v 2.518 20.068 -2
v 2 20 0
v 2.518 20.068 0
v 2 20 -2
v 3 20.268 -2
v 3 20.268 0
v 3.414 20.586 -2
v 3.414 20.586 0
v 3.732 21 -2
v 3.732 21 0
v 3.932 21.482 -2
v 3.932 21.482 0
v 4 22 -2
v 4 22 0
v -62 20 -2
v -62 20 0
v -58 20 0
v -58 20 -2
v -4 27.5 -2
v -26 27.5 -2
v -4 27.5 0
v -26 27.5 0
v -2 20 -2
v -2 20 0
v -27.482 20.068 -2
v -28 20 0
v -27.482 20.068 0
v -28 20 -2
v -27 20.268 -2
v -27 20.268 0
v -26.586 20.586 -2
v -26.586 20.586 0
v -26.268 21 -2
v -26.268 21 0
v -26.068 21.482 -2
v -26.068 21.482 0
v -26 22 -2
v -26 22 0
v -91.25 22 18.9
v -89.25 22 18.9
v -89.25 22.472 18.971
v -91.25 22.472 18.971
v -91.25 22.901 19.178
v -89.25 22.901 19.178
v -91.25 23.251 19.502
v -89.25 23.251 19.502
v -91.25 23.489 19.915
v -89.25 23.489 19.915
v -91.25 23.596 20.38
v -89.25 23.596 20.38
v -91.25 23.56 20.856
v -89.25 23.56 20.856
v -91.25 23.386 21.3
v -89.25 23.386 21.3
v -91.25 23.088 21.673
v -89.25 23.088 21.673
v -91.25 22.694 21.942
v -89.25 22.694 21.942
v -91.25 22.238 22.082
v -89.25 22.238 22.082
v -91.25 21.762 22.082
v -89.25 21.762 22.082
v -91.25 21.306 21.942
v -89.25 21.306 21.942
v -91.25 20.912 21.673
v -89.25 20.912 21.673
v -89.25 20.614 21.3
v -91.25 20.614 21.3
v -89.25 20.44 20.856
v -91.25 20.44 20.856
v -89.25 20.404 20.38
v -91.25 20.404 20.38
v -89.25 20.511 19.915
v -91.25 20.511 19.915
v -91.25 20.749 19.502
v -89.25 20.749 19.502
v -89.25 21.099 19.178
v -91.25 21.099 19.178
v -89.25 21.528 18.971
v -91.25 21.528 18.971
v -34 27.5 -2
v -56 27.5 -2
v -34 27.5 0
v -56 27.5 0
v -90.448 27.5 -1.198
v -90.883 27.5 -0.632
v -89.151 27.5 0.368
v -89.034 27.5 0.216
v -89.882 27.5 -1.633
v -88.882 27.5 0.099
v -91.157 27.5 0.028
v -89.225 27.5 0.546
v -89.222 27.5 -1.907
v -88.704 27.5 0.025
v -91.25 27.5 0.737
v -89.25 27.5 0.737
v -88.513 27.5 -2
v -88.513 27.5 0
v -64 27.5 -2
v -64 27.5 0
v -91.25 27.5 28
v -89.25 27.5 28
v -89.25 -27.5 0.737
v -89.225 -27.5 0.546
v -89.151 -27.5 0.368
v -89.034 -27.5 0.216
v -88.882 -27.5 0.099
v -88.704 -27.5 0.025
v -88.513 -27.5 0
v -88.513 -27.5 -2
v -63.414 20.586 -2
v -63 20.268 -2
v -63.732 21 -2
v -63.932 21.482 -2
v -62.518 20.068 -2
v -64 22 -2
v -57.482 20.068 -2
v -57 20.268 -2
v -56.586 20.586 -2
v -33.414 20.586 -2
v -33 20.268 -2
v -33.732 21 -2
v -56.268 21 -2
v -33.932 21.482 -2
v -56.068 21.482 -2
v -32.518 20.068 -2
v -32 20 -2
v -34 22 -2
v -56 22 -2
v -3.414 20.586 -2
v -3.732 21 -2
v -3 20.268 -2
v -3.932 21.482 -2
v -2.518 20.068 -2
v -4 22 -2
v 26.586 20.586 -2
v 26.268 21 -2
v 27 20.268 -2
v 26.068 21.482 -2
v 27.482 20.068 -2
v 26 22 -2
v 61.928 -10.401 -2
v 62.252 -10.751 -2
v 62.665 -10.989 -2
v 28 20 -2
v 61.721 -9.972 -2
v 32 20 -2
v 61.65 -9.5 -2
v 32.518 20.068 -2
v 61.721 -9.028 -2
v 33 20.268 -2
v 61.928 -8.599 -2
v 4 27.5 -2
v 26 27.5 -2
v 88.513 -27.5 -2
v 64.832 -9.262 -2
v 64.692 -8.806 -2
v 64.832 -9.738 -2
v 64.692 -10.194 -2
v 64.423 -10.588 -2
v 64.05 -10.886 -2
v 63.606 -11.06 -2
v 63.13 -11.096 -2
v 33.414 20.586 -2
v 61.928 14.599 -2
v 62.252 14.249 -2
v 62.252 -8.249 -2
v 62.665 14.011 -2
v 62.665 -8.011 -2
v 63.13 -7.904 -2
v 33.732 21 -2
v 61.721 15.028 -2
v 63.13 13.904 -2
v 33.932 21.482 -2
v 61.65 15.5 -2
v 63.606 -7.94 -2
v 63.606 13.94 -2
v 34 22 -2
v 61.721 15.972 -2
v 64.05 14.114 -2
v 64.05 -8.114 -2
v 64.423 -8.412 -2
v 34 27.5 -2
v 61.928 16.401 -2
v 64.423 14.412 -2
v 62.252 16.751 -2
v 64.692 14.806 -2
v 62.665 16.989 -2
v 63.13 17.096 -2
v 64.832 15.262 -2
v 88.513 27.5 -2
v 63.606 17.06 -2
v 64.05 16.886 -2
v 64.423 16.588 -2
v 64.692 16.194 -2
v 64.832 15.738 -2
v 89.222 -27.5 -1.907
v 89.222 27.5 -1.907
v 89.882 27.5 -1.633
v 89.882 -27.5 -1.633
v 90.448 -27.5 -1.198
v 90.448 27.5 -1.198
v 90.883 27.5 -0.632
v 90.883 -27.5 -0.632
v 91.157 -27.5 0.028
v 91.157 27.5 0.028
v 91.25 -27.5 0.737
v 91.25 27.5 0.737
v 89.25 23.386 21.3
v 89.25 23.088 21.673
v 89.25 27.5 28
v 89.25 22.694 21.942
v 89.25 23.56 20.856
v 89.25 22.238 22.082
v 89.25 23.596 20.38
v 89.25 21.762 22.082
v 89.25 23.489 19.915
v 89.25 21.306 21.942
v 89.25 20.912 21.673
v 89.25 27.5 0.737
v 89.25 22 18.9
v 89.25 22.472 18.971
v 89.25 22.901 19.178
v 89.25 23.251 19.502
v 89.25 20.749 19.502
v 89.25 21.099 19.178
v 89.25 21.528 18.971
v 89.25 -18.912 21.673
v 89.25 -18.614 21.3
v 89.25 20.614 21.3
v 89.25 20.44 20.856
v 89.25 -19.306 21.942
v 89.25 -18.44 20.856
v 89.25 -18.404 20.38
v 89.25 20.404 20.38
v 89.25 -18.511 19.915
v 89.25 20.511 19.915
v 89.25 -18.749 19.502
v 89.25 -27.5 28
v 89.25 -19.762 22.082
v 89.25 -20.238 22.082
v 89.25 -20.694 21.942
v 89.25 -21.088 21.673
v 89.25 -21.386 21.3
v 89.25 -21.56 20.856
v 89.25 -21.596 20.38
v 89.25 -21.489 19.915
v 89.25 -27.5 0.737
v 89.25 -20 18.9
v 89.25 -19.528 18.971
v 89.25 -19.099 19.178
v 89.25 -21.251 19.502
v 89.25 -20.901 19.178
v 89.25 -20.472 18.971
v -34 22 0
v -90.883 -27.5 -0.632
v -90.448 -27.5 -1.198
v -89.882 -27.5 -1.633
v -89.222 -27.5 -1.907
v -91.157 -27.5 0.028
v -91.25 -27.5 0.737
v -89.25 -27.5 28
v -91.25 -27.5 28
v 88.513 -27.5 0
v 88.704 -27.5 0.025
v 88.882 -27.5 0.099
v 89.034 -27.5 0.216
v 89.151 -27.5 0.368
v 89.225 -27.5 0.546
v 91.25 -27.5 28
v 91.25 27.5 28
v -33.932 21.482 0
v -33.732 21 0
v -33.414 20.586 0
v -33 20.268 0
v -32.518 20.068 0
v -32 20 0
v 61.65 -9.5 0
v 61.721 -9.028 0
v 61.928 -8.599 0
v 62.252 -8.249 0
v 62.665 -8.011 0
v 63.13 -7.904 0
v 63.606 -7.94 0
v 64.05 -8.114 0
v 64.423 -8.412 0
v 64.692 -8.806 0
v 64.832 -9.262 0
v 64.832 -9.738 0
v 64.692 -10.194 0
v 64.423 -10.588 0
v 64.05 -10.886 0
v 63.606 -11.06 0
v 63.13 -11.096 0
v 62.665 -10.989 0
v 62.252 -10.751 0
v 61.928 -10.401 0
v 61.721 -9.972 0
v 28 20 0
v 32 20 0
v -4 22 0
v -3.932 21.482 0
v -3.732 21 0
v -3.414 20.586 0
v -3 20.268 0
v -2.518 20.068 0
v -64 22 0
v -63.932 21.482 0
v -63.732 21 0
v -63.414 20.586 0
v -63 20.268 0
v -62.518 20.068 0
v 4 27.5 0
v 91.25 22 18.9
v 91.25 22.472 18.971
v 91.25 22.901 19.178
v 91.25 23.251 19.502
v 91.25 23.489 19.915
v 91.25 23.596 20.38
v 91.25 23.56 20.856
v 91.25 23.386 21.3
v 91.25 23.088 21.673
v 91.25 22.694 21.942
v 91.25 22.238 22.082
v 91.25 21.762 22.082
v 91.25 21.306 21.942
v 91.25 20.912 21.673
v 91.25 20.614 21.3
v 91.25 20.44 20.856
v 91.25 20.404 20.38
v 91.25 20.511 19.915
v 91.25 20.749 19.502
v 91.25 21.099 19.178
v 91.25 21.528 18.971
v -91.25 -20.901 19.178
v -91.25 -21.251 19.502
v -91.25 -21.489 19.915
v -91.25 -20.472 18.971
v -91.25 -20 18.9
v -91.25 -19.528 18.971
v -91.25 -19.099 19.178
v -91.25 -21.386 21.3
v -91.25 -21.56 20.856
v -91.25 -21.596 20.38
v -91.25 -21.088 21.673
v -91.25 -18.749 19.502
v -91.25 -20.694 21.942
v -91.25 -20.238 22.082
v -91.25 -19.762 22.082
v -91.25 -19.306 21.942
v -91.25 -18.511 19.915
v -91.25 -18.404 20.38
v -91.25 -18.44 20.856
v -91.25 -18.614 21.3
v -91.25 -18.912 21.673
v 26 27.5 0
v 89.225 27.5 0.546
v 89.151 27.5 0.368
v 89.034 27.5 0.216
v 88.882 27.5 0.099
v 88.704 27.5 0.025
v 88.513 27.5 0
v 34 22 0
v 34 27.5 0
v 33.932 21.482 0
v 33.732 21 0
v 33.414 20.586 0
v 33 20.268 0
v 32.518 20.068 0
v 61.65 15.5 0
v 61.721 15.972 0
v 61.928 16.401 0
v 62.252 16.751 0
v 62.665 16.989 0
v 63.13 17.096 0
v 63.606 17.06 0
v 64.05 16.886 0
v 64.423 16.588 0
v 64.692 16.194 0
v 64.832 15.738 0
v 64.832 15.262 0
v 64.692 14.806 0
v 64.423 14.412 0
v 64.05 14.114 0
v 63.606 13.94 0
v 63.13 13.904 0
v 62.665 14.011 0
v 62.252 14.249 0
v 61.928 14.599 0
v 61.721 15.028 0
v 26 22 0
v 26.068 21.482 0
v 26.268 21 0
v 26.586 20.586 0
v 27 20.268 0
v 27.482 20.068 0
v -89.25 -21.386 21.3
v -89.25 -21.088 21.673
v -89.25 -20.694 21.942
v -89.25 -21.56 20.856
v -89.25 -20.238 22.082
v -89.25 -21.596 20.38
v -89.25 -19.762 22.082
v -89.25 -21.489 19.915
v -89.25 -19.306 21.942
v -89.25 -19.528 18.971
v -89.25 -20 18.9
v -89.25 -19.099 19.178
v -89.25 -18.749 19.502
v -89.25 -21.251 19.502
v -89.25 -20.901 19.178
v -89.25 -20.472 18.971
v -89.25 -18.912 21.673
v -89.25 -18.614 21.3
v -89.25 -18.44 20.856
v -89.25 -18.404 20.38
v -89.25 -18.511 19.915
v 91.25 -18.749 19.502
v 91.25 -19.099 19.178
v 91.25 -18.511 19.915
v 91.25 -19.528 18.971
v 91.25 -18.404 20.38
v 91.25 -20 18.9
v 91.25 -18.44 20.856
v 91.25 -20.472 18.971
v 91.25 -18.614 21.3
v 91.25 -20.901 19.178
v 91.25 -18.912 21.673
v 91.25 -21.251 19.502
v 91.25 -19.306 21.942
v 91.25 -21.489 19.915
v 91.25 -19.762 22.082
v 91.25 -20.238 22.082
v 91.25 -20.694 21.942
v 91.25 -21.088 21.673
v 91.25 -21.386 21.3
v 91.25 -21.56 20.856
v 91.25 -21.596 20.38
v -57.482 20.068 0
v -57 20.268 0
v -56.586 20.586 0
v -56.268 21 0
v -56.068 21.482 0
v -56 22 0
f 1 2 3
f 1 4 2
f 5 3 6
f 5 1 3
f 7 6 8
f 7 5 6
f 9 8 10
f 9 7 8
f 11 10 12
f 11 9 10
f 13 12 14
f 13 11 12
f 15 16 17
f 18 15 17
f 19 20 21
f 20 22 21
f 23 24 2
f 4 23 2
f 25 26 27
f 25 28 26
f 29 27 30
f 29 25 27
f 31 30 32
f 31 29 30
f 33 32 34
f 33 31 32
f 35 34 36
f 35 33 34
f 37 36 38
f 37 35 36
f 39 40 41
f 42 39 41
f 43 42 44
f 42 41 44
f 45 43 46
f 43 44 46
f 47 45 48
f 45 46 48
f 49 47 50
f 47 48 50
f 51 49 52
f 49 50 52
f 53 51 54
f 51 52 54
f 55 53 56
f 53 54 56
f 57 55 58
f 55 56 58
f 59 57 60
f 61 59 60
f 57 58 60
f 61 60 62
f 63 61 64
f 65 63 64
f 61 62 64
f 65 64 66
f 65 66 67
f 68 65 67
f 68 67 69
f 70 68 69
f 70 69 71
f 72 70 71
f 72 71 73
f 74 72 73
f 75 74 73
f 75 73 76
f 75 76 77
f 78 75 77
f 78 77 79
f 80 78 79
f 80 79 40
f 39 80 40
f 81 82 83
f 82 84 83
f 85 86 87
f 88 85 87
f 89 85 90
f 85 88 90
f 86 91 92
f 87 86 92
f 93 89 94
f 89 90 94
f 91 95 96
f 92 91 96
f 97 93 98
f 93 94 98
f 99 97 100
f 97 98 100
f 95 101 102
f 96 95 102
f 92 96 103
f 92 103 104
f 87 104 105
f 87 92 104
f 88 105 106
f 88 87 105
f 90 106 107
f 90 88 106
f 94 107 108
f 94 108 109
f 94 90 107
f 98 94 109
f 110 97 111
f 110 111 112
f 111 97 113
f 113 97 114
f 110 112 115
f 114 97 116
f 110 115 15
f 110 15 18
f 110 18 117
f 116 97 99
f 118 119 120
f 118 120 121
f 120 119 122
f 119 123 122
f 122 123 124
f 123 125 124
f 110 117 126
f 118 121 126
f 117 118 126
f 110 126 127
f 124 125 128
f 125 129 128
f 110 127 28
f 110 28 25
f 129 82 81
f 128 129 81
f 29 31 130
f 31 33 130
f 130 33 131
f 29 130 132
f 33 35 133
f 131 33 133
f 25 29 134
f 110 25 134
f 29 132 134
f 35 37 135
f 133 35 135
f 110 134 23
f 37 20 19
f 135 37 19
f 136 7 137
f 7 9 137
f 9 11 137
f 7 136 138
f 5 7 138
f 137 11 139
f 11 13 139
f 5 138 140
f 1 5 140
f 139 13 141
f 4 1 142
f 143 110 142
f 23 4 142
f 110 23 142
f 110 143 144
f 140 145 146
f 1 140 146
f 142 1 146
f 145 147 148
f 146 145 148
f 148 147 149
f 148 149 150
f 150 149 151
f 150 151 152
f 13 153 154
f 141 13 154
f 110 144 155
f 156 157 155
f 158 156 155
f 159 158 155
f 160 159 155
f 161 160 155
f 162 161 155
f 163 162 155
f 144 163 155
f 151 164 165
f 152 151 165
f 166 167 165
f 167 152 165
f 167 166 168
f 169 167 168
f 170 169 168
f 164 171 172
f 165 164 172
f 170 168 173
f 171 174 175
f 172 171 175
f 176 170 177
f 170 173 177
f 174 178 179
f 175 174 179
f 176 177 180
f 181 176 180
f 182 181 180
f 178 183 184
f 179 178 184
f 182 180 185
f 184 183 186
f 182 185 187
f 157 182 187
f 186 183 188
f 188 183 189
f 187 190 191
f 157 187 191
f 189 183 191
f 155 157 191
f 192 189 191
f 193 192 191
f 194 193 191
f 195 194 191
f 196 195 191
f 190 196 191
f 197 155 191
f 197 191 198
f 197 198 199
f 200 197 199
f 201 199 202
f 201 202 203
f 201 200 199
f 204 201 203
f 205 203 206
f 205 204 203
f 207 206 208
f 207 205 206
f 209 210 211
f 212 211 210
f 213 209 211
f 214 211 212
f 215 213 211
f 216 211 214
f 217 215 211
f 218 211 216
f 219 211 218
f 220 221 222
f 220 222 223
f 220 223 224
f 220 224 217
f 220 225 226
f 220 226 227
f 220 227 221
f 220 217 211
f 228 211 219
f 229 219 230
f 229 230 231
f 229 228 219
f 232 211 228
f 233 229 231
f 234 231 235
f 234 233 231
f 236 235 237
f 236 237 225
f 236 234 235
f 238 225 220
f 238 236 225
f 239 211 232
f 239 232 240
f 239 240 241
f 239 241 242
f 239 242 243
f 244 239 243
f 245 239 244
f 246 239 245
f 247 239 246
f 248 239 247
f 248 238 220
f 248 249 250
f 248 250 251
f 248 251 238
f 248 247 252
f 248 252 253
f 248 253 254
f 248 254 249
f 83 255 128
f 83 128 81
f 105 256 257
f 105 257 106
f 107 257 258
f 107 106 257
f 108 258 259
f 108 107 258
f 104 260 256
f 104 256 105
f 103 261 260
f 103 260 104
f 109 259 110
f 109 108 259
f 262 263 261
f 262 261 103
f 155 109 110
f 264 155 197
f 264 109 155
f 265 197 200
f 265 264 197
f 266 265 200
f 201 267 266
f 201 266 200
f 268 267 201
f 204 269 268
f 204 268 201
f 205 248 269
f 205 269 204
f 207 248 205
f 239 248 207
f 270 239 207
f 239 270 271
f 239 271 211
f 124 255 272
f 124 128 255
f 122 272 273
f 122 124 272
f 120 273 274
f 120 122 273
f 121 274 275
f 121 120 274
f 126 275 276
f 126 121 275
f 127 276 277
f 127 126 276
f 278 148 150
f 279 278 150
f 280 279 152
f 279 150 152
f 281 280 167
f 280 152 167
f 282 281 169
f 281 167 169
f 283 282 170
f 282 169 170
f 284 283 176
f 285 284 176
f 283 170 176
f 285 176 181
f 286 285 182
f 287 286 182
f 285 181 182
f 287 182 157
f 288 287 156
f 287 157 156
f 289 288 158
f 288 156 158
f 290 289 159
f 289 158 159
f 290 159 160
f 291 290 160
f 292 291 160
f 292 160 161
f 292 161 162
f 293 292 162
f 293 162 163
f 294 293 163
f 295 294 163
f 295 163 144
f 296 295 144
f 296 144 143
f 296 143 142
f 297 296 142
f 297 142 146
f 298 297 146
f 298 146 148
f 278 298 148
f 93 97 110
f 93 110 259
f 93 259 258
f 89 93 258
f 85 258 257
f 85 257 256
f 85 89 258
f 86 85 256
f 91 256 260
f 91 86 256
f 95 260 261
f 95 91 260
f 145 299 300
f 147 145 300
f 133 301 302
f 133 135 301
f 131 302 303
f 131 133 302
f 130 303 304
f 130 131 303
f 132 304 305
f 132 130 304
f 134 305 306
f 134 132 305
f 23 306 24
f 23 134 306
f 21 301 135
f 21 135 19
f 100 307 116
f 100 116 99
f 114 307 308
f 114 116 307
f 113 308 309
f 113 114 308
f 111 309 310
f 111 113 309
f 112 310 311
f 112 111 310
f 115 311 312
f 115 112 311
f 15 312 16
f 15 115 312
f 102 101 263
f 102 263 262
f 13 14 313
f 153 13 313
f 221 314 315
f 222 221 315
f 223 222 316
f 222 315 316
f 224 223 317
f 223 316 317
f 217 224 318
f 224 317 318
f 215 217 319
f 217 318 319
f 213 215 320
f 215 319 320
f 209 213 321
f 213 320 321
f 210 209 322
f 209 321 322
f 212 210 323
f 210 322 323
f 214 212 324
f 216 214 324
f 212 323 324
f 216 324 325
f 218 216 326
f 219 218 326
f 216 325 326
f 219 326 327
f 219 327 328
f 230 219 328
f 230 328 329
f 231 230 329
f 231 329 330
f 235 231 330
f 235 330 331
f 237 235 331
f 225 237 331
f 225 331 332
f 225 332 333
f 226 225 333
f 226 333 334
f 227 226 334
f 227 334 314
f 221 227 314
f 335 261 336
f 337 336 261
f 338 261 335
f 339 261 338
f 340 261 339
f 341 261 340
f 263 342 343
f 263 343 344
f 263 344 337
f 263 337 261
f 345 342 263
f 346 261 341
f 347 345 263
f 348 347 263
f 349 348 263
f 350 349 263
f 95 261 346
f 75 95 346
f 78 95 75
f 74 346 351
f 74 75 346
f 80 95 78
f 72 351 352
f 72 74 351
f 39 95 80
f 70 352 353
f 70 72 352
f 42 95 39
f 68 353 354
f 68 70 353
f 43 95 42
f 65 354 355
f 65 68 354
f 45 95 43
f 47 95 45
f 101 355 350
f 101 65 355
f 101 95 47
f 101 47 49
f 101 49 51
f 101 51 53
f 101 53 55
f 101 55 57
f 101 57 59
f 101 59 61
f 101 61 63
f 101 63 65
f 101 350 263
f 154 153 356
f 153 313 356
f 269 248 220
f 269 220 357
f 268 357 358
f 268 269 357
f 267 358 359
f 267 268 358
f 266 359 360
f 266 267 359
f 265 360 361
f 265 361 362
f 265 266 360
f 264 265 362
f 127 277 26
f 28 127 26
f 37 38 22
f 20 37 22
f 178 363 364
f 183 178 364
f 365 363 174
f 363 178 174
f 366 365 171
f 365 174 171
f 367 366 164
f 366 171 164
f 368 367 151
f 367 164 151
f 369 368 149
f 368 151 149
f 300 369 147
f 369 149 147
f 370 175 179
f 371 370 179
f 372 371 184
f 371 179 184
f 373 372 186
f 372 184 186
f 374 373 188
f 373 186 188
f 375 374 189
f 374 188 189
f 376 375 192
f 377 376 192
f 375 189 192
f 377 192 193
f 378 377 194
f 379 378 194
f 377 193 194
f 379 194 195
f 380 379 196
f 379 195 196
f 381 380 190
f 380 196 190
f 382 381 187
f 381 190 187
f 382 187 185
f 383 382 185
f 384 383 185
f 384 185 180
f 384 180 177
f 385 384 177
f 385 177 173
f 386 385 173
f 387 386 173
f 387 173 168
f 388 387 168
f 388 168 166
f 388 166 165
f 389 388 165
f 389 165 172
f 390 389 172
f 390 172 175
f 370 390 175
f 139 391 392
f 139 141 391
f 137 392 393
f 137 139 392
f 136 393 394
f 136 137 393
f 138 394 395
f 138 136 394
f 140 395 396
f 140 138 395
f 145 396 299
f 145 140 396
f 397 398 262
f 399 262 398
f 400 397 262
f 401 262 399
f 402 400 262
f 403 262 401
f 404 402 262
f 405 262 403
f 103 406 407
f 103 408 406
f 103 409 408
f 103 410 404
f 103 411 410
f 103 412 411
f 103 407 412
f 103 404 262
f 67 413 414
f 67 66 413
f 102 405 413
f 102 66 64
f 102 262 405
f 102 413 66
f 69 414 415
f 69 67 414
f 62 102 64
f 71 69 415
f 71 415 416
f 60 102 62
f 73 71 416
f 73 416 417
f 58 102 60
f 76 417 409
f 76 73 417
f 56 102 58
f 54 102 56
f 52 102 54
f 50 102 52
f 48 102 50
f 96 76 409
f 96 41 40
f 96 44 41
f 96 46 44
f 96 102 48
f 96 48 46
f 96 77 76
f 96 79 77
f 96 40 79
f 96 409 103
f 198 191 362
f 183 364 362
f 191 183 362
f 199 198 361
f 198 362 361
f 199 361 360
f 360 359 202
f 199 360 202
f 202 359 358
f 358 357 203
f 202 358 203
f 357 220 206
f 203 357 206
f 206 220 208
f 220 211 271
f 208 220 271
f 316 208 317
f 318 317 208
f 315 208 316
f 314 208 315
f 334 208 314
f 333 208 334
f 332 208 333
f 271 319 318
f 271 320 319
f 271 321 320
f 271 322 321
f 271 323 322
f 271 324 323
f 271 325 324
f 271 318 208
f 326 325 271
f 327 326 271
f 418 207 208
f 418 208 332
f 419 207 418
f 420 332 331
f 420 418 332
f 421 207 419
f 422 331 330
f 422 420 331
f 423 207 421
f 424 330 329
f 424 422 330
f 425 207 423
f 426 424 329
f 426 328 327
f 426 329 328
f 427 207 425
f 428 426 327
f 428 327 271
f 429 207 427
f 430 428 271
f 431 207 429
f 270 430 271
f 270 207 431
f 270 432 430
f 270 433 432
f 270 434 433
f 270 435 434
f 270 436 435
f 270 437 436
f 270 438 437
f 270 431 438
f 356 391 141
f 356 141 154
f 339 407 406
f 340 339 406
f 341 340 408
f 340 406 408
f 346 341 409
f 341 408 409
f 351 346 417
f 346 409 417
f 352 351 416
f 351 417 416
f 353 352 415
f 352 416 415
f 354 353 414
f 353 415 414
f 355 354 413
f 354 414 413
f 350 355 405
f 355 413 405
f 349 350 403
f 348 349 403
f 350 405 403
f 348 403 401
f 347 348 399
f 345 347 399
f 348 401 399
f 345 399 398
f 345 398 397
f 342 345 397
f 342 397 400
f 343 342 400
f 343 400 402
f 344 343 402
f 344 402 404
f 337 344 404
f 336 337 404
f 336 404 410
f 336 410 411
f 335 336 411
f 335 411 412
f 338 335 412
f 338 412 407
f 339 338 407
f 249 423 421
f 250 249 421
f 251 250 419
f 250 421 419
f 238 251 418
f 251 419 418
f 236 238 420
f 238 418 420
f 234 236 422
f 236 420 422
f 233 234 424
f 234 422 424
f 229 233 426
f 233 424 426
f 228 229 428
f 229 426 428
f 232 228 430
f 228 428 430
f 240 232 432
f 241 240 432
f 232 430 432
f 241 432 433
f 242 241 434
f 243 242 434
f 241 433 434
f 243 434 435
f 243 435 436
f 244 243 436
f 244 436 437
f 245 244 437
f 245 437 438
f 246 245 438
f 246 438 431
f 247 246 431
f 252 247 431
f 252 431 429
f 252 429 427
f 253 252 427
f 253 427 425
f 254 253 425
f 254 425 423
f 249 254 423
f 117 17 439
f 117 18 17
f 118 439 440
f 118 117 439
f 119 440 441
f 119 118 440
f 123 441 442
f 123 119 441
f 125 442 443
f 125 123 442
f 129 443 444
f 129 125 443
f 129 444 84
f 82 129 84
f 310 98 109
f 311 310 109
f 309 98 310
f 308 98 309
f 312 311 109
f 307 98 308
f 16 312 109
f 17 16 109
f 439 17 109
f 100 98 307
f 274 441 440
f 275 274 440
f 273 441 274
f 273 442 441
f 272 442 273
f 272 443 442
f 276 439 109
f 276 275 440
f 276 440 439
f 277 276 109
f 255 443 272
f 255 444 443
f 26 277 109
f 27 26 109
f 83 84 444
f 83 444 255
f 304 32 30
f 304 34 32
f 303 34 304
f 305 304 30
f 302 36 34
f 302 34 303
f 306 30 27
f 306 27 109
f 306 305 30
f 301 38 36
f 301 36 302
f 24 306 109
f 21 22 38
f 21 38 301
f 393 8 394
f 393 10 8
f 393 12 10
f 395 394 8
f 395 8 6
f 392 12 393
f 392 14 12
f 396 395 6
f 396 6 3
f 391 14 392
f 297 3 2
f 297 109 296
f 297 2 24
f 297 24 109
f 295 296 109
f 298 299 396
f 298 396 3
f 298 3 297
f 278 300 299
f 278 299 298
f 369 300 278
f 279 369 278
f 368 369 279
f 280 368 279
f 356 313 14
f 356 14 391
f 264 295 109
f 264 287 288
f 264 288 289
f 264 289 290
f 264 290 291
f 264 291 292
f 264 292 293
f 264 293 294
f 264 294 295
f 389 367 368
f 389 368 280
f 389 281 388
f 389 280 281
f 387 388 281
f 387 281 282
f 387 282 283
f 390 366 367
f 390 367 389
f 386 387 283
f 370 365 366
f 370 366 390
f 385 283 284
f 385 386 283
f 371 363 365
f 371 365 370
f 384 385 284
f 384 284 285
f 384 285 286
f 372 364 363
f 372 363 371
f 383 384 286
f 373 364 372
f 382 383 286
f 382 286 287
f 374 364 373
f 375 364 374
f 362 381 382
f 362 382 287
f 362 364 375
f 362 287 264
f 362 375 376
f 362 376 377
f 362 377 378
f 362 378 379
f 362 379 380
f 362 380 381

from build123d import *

# Parameters (mm, degrees)
SKETCH_1_W                         = 182.5
SKETCH_1_H                         = 55
SM_BASE_FLANGE_1_DEPTH             = 2
SM_EDGE_FLANGE_1_STRIP_W           = 9.4732
SM_EDGE_FLANGE_1_STRIP_H           = 2
SM_EDGE_FLANGE_1_STRIP_CUT_DEPTH   = 55
SM_EDGE_FLANGE_1_STRIP_2_W         = 9.4732
SM_EDGE_FLANGE_1_STRIP_2_H         = 2
SM_EDGE_FLANGE_1_STRIP_CUT_2_DEPTH = 55
SM_EDGE_FLANGE_1_DEPTH             = 55
SM_EDGE_FLANGE_1_BEND_DEPTH        = 55
SKETCH_12_W                        = 8
SKETCH_12_H                        = 7.5
CUT_EXTRUDE_1_DEPTH                = 10
FILLET_1_R                         = 2
SKETCH_13_R                        = 1.6
CUT_EXTRUDE_2_DEPTH                = 197
SKETCH_14_R                        = 1.6
CUT_EXTRUDE_3_DEPTH                = 10


# Sheet-metal steps are written as plain solids
with BuildPart() as part:
    # Sketch 1 → Базовая кромка1 (new body)
    with BuildSketch(Plane.XY):
        Rectangle(SKETCH_1_W, SKETCH_1_H)
    extrude(amount=-SM_BASE_FLANGE_1_DEPTH)

    # Ребро-кромка1 strip (across the edge) → Ребро-кромка1 strip cut (cut)
    with BuildSketch(Plane(origin=(-91.25, 27.5, 0), x_dir=(1, 0, 0), z_dir=(0, -1, 0))):
        with Locations((-2, -1)):
            Rectangle(SM_EDGE_FLANGE_1_STRIP_W, SM_EDGE_FLANGE_1_STRIP_H)
    extrude(amount=SM_EDGE_FLANGE_1_STRIP_CUT_DEPTH, mode=Mode.SUBTRACT)

    # Ребро-кромка1 strip 2 (across the edge) → Ребро-кромка1 strip cut 2 (cut)
    with BuildSketch(Plane(origin=(91.25, -27.5, 0), x_dir=(-1, 0, 0), z_dir=(0, 1, 0))):
        with Locations((-2, -1)):
            Rectangle(SM_EDGE_FLANGE_1_STRIP_2_W, SM_EDGE_FLANGE_1_STRIP_2_H)
    extrude(amount=SM_EDGE_FLANGE_1_STRIP_CUT_2_DEPTH, mode=Mode.SUBTRACT)

    # Ребро-кромка1 section (across the edge) → Ребро-кромка1 (add)
    with BuildSketch(Plane(origin=(-91.25, 27.5, 0), x_dir=(1, 0, 0), z_dir=(0, -1, 0))):
        with BuildLine():
            Line((0, 0.7366), (0, 28))
            Line((0, 28), (2, 28))
            Line((2, 28), (2, 0.7366))
            ThreePointArc((2, 0.7366), (2.215745145, 0.215745145), (2.7366, 0))
            Line((2.7366, 0), (2.7366, -2))
            ThreePointArc((2.7366, -2), (0.801531583, -1.198468417), (0, 0.7366))
        make_face()
    extrude(amount=SM_EDGE_FLANGE_1_DEPTH)

    # Ребро-кромка1 section 2 (across the edge) → Ребро-кромка1 bend (add)
    with BuildSketch(Plane(origin=(91.25, -27.5, 0), x_dir=(-1, 0, 0), z_dir=(0, 1, 0))):
        with BuildLine():
            Line((0, 0.7366), (0, 28))
            Line((0, 28), (2, 28))
            Line((2, 28), (2, 0.7366))
            ThreePointArc((2, 0.7366), (2.215745145, 0.215745145), (2.7366, 0))
            Line((2.7366, 0), (2.7366, -2))
            ThreePointArc((2.7366, -2), (0.801531583, -1.198468417), (0, 0.7366))
        make_face()
    extrude(amount=SM_EDGE_FLANGE_1_BEND_DEPTH)

    # Эскиз12 → Вырез-Вытянуть1 (cut)
    with BuildSketch(Plane.XY):
        with Locations((0, 23.75)):
            Rectangle(SKETCH_12_W, SKETCH_12_H)
        with Locations((30, 23.75)):
            Rectangle(SKETCH_12_W, SKETCH_12_H)
        with Locations((-30, 23.75)):
            Rectangle(SKETCH_12_W, SKETCH_12_H)
        with Locations((-60, 23.75)):
            Rectangle(SKETCH_12_W, SKETCH_12_H)
    extrude(amount=-CUT_EXTRUDE_1_DEPTH, mode=Mode.SUBTRACT)

    # Скругление1
    fillet_1_edges = [part.edges().sort_by_distance(p)[0] for p in [
        (-56, 20, -1),
        (-64, 20, -1),
        (-26, 20, -1),
        (-34, 20, -1),
        (34, 20, -1),
        (26, 20, -1),
        (4, 20, -1),
        (-4, 20, -1),
    ]]
    fillet(fillet_1_edges, radius=FILLET_1_R)

    # Эскиз13 → Вырез-Вытянуть2 (cut)
    with BuildSketch(Plane(origin=(91.25, 0, 0), x_dir=(0, 0, -1), z_dir=(1, 0, 0))):
        with Locations((-20.5, -20)):
            Circle(SKETCH_13_R)
        with Locations((-20.5, 22)):
            Circle(SKETCH_13_R)
    extrude(amount=-CUT_EXTRUDE_2_DEPTH, mode=Mode.SUBTRACT)

    # Эскиз14 → Вырез-Вытянуть3 (cut)
    with BuildSketch(Plane(origin=(0, 0, -2), x_dir=(-1, 0, 0), z_dir=(0, 0, -1))):
        with Locations((-63.25, 15.5)):
            Circle(SKETCH_14_R)
        with Locations((-63.25, -9.5)):
            Circle(SKETCH_14_R)
    extrude(amount=-CUT_EXTRUDE_3_DEPTH, mode=Mode.SUBTRACT)


solid = part.part
